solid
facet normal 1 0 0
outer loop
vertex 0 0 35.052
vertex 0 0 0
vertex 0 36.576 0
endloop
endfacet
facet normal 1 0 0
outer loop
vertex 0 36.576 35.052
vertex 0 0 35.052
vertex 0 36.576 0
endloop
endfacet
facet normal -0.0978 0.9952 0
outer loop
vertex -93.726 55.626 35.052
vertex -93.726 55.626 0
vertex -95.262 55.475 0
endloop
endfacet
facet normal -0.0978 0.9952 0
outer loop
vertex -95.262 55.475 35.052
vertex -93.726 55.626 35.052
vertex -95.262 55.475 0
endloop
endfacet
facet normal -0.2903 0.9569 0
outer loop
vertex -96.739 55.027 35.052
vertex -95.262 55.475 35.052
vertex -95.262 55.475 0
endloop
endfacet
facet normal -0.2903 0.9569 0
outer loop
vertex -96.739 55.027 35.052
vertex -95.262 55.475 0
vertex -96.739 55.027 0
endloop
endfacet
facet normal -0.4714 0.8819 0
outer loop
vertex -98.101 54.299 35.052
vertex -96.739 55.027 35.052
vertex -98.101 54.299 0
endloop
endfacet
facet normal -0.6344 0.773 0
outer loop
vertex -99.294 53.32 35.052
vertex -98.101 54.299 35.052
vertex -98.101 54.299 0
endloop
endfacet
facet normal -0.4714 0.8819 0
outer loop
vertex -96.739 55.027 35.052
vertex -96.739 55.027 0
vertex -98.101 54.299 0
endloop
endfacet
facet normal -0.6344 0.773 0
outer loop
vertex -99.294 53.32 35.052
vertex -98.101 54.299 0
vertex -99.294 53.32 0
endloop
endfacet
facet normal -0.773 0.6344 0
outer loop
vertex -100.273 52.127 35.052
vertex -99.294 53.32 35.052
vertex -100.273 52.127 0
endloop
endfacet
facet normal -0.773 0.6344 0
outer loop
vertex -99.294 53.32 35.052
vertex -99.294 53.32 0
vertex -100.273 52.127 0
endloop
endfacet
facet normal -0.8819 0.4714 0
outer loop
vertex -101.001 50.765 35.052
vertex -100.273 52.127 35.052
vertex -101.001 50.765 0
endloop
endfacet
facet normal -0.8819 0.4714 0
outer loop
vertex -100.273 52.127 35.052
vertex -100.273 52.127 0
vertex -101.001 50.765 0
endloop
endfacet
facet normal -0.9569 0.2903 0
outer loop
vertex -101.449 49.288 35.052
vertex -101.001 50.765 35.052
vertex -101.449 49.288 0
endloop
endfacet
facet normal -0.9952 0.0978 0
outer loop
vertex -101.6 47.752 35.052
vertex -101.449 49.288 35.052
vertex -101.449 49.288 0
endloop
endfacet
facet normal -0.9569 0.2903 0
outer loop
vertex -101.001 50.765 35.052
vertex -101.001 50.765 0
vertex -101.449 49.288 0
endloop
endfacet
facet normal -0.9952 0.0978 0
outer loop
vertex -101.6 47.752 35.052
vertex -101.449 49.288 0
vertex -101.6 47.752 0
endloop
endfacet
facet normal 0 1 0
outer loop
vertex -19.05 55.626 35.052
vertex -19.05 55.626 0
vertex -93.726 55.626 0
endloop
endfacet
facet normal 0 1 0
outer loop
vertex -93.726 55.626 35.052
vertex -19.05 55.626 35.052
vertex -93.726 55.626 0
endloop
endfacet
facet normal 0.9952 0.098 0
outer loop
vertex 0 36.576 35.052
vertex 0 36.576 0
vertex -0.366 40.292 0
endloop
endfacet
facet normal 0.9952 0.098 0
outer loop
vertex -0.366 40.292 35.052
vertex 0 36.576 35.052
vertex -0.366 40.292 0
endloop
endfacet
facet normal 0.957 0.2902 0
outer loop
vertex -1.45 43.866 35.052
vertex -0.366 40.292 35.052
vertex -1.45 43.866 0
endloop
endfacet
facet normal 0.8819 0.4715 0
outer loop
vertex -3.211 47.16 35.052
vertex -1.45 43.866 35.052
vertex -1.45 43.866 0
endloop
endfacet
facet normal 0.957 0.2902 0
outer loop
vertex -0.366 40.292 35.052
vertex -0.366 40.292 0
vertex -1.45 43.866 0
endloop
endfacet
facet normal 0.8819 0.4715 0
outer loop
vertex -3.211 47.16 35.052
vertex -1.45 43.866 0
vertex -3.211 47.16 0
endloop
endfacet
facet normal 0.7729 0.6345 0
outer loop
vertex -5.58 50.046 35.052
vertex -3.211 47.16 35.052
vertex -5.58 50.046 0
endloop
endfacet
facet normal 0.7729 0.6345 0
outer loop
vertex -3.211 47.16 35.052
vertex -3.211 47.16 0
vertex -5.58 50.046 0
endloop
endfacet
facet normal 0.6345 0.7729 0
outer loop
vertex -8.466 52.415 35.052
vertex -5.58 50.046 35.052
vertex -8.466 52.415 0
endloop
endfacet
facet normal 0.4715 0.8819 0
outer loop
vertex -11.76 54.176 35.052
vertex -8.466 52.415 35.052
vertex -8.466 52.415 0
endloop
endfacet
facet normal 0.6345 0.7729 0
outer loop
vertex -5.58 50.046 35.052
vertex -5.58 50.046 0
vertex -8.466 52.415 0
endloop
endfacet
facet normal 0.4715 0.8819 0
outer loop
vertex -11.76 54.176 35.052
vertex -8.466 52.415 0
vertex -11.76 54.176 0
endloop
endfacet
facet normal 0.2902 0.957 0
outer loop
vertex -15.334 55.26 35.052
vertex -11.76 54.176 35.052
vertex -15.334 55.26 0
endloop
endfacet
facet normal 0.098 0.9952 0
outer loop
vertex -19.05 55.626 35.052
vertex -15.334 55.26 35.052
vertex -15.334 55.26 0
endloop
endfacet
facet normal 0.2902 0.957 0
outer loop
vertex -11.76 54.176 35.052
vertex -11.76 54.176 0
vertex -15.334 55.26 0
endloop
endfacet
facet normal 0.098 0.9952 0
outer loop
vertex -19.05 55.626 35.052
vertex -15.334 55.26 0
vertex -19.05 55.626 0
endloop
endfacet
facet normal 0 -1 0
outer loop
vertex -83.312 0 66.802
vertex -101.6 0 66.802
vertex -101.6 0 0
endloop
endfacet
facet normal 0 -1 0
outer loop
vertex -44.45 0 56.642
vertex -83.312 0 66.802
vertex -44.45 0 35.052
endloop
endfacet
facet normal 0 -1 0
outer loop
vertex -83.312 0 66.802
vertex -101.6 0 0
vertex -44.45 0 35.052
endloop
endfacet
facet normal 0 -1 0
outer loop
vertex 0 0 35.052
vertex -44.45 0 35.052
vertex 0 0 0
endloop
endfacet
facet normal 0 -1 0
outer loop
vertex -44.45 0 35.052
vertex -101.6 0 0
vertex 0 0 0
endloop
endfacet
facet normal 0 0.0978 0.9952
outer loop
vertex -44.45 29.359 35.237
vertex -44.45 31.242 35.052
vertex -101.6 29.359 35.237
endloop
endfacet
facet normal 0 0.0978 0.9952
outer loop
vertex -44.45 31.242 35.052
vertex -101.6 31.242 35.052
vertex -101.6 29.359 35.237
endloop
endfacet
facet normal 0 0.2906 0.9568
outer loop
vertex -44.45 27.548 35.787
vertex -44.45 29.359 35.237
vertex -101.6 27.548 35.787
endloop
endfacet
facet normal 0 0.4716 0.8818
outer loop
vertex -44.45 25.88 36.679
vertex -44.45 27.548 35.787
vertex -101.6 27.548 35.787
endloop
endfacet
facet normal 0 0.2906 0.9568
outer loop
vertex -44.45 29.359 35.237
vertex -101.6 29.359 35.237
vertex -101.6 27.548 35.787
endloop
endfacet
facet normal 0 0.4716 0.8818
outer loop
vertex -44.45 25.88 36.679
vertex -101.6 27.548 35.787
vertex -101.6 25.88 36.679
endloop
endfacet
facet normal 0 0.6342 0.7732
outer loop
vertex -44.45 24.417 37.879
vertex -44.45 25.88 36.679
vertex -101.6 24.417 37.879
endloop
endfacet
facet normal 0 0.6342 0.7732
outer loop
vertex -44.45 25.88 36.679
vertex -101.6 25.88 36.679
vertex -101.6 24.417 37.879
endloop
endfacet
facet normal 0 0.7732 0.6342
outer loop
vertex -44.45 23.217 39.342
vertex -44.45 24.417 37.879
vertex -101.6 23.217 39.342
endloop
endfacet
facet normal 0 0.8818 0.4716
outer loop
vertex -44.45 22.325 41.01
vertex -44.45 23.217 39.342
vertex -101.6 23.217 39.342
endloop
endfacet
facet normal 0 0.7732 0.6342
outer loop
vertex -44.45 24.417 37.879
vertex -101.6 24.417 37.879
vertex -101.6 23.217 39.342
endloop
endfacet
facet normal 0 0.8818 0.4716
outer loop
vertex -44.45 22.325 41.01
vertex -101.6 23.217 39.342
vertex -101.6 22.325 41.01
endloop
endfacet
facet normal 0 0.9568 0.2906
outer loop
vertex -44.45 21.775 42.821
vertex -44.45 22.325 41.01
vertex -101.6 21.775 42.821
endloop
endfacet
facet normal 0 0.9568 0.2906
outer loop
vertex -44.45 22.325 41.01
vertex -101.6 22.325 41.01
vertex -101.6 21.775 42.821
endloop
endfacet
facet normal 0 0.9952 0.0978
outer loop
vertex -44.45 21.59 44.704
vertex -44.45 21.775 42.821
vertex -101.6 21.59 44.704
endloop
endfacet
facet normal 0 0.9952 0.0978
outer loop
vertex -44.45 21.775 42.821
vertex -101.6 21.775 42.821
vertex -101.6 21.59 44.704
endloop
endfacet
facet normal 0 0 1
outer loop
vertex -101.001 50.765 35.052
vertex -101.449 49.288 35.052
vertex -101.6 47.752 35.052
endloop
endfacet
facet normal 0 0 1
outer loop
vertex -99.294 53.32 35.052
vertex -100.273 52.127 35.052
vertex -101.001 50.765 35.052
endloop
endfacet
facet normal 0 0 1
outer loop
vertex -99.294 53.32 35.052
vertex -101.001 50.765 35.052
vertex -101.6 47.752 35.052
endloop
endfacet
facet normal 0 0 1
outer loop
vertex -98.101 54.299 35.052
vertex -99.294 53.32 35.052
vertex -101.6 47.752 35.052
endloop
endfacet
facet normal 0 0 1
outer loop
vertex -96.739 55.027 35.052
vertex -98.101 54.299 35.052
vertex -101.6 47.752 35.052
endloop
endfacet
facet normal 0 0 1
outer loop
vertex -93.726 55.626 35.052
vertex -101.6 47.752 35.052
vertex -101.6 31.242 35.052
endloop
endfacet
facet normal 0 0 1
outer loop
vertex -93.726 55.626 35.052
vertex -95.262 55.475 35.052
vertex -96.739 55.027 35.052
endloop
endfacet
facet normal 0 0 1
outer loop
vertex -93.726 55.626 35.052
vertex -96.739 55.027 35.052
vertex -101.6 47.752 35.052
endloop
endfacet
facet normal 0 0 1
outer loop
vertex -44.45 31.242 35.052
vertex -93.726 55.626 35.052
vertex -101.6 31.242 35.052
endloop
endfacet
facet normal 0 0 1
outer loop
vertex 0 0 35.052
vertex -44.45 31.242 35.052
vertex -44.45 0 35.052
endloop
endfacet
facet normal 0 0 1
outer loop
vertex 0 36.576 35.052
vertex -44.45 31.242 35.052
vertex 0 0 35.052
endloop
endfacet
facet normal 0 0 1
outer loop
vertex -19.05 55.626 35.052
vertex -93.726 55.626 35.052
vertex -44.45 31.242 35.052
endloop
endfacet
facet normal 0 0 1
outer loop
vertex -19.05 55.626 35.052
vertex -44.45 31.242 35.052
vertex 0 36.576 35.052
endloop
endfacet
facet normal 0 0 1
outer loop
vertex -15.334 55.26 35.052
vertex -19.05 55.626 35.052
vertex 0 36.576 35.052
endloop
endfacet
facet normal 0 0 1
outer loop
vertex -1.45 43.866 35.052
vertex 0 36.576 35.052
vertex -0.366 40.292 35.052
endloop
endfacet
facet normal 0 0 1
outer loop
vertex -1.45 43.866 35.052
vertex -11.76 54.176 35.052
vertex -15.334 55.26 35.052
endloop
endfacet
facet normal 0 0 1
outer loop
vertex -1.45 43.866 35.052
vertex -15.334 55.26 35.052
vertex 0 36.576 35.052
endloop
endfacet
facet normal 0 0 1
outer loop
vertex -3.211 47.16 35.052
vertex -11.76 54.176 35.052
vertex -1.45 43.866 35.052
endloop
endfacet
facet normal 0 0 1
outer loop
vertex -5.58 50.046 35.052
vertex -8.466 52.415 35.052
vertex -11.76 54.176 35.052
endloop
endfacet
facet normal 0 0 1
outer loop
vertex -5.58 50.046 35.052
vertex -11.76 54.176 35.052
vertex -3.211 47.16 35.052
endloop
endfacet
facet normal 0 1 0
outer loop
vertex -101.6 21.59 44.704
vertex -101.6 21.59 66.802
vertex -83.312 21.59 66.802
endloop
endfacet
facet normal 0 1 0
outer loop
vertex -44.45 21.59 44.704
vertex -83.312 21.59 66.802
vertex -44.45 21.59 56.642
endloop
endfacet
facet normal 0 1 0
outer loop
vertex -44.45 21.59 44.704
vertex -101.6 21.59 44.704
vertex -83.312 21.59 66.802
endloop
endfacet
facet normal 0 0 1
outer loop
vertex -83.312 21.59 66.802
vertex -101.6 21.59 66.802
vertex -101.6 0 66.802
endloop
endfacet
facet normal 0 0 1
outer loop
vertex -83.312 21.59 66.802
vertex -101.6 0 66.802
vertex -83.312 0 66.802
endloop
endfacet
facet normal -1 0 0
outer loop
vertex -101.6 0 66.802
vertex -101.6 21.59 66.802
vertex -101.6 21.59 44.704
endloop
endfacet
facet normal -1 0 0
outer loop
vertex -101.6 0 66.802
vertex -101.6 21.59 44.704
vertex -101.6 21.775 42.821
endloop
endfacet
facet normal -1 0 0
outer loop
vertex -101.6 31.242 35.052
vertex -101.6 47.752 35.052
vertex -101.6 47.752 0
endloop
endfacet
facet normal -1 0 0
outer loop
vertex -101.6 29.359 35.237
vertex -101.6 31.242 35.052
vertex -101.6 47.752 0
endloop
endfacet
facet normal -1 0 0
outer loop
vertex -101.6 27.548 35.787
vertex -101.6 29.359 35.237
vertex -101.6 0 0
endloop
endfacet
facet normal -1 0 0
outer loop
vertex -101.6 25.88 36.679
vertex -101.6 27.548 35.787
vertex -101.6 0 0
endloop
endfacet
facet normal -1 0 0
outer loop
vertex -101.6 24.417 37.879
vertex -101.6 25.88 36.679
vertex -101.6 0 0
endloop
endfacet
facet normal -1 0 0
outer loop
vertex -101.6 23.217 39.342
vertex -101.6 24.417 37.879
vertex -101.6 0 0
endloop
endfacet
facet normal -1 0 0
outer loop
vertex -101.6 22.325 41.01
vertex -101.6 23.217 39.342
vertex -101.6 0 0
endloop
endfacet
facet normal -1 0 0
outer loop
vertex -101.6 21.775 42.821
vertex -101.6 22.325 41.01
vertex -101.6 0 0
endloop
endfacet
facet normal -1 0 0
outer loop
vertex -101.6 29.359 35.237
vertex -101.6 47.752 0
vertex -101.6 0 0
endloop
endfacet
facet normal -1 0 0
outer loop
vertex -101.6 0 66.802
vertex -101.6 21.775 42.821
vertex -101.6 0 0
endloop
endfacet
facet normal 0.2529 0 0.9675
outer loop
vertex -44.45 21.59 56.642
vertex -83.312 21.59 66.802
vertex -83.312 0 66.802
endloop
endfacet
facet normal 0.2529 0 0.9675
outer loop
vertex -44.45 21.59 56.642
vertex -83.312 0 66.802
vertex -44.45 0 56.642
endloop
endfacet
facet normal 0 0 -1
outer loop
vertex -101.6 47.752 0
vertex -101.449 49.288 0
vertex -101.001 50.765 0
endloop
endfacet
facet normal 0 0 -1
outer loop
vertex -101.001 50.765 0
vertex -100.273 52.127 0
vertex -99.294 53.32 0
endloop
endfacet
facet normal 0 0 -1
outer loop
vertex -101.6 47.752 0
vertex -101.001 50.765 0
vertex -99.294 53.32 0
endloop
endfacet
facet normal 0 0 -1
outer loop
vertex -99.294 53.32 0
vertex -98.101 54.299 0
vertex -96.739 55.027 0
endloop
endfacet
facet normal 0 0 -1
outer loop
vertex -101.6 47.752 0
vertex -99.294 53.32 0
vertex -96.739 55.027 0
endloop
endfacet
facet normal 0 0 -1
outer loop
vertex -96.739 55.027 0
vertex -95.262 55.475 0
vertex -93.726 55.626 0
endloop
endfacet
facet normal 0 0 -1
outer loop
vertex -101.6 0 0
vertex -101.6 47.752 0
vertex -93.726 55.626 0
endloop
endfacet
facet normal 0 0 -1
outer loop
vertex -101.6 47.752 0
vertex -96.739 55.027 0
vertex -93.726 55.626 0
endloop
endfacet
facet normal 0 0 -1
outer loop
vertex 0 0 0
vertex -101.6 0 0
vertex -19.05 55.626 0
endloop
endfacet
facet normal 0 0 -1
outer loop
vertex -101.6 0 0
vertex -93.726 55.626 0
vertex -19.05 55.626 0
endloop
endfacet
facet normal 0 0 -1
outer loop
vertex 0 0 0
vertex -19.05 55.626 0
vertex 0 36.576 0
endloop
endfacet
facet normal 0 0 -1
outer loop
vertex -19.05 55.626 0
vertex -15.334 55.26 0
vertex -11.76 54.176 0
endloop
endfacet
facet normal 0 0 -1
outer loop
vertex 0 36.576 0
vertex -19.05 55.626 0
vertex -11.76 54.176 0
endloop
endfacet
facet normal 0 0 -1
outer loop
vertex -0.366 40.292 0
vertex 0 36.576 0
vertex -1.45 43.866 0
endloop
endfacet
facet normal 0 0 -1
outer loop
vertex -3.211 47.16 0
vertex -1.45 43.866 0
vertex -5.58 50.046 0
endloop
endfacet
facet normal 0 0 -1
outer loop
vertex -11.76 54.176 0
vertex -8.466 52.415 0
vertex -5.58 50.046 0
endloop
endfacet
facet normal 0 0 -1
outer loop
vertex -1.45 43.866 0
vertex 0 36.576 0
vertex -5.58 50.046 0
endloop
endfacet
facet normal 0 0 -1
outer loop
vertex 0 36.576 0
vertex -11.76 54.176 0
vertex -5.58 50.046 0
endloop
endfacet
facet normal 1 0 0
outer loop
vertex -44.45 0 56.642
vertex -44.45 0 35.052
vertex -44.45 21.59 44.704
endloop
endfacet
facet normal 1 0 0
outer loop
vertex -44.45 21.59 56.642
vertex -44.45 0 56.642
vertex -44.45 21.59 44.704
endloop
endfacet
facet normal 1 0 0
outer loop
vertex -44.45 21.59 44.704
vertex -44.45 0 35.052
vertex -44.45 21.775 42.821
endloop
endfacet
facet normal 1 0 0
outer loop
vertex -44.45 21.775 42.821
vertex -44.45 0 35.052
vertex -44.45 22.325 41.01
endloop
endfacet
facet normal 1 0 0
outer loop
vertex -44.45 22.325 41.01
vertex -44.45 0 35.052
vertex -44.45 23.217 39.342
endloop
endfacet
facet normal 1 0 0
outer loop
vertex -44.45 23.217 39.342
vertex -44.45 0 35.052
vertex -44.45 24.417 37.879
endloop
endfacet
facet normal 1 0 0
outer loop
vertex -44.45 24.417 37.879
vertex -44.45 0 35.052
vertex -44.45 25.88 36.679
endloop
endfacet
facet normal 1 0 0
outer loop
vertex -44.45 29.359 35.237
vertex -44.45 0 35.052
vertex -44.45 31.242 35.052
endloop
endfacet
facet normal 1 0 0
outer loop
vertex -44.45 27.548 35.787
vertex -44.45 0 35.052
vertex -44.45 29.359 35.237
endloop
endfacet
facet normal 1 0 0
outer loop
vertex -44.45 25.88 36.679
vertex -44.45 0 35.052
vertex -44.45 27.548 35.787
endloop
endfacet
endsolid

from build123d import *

# Parameters (mm, degrees)
BOSS_EXTRUDE1_DEPTH = 35.052
SKETCH1_4_W         = 57.15
SKETCH1_4_H         = 21.59
BOSS_EXTRUDE2_DEPTH = 66.802
FILLET1_R           = 9.652
CUT_EXTRUDE1_DEPTH  = 127.267638372


with BuildPart() as part:
    # Sketch1 → Boss-Extrude1 (new body)
    with BuildSketch(Plane.XY):
        with BuildLine():
            Line((0, 0), (0, 36.576))
            ThreePointArc((0, 36.576), (-5.579615818, 50.046384182), (-19.05, 55.626))
            Line((-19.05, 55.626), (-93.726, 55.626))
            ThreePointArc((-93.726, 55.626), (-99.293758795, 53.319758795), (-101.6, 47.752))
            Line((-101.6, 47.752), (-101.6, 0))
            Line((-101.6, 0), (0, 0))
        make_face()
    extrude(amount=BOSS_EXTRUDE1_DEPTH)

    # Sketch1<4> → Boss-Extrude2 (add)
    with BuildSketch(Plane.XY):
        with Locations((-73.025, 10.795)):
            Rectangle(SKETCH1_4_W, SKETCH1_4_H)
    extrude(amount=BOSS_EXTRUDE2_DEPTH)

    # Fillet1
    fillet1_edges = [part.edges().sort_by_distance(p)[0] for p in [
        (-73.025, 21.59, 35.052),
    ]]
    fillet(fillet1_edges, radius=FILLET1_R)

    # Sketch3 → Cut-Extrude1 (cut, through all)
    with BuildSketch(Plane(origin=(0, 21.59, 0), x_dir=(1, 0, 0), z_dir=(0, 1, 0))):
        Polygon((-83.312, -66.802), (-44.45, -56.642), (-44.45, -66.802), align=None)
    extrude(amount=-CUT_EXTRUDE1_DEPTH, mode=Mode.SUBTRACT)


solid = part.part
